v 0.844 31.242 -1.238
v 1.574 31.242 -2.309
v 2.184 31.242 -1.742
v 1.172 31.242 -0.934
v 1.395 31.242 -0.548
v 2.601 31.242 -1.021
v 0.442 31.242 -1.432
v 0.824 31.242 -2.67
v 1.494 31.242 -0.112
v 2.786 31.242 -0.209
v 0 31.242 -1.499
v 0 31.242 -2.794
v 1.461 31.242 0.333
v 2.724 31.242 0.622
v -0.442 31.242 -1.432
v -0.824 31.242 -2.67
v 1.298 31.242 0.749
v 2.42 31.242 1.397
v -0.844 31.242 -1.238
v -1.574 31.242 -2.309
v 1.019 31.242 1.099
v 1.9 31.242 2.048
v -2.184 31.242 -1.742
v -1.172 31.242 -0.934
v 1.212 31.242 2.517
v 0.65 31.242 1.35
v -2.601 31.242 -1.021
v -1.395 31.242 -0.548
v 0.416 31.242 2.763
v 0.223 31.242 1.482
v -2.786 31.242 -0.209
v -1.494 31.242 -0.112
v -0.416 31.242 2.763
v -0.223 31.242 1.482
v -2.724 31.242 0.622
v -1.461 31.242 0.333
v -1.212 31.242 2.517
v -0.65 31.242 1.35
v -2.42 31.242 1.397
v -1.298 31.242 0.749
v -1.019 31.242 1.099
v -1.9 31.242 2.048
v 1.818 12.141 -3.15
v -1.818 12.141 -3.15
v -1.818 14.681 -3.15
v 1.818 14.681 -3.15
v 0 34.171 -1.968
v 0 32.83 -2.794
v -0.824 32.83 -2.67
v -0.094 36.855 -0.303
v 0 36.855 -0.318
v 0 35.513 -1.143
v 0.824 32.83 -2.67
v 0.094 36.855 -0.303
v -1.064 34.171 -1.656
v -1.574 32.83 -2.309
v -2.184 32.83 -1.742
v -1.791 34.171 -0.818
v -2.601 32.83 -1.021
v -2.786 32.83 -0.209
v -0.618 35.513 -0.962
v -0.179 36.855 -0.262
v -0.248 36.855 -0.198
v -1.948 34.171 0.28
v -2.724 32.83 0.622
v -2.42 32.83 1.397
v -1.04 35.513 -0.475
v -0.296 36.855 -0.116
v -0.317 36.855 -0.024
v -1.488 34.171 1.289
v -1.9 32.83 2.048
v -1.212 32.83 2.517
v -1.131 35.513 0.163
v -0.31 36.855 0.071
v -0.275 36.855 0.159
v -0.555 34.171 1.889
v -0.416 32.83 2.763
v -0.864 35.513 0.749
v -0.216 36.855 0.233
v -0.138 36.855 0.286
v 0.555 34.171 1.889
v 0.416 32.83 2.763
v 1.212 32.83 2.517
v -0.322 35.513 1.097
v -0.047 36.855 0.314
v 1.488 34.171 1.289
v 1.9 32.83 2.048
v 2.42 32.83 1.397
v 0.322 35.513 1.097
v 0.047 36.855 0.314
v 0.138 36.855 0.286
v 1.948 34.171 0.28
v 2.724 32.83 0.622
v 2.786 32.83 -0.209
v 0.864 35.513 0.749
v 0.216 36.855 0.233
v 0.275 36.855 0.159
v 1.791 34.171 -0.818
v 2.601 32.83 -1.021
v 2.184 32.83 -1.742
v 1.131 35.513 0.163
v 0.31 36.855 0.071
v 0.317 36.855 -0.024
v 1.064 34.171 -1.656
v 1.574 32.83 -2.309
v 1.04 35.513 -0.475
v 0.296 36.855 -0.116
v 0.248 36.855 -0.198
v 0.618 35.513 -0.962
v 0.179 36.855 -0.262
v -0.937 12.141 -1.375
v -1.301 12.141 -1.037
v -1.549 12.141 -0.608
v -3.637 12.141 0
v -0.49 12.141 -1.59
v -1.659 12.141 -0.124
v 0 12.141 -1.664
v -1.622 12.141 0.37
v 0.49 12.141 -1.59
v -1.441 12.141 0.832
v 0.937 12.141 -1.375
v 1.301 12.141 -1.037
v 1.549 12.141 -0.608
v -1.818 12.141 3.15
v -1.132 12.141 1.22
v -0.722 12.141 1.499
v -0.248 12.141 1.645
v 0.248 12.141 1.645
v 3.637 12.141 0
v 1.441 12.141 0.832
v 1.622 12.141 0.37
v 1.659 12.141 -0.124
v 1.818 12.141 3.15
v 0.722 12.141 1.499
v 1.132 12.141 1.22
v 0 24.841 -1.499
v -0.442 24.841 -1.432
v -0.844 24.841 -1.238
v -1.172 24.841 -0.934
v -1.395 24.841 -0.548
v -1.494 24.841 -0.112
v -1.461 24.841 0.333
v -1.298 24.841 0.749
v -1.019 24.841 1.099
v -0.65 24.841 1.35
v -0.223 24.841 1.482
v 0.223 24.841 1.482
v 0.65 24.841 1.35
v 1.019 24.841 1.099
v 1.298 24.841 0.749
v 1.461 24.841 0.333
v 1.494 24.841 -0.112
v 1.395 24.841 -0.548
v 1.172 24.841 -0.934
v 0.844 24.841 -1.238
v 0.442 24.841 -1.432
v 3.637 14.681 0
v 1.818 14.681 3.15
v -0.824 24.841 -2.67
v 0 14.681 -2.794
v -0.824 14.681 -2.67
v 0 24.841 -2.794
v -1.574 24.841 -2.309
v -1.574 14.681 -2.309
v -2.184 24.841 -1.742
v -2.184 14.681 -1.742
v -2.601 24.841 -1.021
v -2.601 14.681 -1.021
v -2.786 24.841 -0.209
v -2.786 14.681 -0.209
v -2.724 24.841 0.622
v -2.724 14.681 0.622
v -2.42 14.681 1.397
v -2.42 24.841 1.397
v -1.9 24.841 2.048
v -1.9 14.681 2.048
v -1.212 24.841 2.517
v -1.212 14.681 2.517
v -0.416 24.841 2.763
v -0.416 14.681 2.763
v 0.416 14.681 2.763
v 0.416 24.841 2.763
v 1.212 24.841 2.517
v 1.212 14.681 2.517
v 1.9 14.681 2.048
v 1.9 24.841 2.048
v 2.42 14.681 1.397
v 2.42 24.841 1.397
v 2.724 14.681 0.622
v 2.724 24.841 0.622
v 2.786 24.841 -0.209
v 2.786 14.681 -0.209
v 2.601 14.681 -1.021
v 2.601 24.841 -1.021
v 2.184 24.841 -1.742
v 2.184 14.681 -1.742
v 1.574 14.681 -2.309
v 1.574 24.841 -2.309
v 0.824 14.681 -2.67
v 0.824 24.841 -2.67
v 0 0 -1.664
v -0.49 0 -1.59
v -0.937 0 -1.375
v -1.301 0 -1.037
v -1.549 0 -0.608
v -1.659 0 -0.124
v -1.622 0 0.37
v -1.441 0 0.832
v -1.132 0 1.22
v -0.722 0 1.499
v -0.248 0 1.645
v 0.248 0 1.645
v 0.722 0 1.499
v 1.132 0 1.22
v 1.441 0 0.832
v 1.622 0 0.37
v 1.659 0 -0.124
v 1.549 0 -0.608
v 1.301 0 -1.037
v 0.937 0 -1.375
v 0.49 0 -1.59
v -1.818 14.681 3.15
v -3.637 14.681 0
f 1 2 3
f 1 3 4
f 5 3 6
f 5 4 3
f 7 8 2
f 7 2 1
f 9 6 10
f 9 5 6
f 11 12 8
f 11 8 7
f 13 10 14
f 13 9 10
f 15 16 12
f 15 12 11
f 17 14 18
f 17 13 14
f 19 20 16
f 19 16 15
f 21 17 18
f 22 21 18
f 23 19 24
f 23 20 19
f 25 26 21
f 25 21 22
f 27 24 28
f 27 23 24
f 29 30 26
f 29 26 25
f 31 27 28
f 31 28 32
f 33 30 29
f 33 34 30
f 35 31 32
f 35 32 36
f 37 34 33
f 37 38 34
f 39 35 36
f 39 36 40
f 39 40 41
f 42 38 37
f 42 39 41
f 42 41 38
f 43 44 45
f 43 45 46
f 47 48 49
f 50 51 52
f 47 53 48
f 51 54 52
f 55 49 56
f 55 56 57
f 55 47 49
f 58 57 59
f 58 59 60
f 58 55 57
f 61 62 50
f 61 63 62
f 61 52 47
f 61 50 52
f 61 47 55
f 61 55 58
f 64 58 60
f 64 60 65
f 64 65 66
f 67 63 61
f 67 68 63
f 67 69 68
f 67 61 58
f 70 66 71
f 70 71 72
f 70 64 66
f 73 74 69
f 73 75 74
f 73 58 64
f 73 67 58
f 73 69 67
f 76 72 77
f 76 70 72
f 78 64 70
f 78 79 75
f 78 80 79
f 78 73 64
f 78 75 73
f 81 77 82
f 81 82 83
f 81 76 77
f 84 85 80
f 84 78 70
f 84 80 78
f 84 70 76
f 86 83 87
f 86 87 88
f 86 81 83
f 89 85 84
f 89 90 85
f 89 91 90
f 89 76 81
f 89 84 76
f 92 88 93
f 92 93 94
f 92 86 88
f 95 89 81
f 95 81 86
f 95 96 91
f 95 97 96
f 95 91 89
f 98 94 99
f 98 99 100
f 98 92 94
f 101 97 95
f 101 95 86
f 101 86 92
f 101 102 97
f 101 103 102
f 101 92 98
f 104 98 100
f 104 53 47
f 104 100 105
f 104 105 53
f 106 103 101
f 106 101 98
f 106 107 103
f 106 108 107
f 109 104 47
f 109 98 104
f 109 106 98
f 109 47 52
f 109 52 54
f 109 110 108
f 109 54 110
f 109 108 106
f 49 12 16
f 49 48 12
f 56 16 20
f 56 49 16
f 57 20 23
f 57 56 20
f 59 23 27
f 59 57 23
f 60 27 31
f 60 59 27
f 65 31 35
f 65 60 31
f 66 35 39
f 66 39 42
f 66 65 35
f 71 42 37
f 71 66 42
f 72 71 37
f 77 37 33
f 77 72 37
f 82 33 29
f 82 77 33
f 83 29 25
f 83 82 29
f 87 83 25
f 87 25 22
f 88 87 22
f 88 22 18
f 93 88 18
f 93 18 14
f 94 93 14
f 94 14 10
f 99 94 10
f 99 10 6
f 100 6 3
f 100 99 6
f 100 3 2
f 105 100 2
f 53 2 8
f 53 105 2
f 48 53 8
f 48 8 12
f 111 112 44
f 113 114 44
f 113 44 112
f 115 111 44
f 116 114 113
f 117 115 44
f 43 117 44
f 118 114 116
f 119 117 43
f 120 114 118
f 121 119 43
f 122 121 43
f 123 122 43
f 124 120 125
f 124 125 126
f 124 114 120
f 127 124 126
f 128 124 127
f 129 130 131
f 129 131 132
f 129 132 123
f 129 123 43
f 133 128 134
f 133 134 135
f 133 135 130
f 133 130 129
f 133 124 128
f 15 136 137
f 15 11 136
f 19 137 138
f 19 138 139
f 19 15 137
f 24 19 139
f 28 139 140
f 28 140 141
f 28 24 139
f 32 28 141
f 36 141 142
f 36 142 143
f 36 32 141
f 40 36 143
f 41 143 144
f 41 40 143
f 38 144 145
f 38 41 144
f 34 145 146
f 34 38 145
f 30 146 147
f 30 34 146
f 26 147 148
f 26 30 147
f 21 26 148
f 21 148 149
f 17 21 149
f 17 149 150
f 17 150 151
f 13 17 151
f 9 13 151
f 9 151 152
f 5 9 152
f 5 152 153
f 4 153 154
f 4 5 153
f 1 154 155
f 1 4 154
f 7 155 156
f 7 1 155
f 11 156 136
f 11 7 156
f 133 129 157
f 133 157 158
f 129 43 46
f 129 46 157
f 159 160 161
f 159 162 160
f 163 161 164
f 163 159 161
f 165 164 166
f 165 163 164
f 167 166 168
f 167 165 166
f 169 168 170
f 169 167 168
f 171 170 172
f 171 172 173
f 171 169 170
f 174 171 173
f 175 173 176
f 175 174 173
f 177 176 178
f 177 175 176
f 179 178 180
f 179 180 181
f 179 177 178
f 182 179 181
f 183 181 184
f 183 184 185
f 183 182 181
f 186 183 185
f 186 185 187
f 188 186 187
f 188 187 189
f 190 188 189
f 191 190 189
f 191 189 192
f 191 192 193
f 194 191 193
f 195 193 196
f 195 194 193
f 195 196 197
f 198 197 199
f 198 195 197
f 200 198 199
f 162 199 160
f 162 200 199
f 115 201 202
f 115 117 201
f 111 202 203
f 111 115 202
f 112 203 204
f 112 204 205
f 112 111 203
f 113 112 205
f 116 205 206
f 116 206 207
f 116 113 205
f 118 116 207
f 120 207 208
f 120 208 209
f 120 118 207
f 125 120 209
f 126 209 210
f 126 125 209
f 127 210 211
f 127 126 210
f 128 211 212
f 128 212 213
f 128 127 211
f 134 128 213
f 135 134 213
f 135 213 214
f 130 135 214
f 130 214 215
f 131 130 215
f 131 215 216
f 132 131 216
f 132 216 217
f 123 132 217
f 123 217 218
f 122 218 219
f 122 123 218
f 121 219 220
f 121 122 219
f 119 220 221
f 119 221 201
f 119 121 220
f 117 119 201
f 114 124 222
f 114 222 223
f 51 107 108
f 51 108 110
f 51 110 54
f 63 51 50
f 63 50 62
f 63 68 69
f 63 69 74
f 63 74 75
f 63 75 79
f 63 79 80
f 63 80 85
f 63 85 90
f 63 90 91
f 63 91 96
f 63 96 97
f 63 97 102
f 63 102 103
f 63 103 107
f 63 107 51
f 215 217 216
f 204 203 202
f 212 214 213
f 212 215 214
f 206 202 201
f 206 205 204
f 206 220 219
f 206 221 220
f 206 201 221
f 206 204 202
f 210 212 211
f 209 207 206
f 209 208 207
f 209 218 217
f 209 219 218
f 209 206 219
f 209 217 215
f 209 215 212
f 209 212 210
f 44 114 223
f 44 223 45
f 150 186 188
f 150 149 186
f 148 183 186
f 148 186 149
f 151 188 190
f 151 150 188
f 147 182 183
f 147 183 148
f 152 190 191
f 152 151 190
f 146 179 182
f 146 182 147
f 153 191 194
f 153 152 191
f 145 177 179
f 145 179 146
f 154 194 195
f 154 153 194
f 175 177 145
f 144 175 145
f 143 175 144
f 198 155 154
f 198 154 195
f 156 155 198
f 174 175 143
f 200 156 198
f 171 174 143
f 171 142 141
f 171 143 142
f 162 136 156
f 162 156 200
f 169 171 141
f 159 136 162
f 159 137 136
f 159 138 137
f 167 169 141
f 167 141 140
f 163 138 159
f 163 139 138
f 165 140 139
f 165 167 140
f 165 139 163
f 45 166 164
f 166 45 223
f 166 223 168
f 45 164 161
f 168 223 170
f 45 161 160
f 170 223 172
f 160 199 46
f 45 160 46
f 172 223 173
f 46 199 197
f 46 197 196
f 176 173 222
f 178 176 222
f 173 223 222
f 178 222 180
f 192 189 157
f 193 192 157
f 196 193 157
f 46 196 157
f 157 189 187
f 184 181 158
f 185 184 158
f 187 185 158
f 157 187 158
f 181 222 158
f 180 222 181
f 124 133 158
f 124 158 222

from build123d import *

# Parameters (mm, degrees)
BOSS_EXTRUDE1_DEPTH = 2.54


with BuildPart() as part:
    # Sketch1 → Revolve1 (revolve)
    with BuildSketch(Plane.XY, mode=Mode.PRIVATE) as revolve1_sk:
        Polygon((0, 0), (1.6637, 0), (1.6637, 12.1412), (2.794, 12.1412), (2.794, 24.8412), (1.4986, 24.8412), (1.4986, 31.242), (2.794, 31.242), (2.794, 32.8295), (0.3175, 36.8554), (0, 36.8554), align=None)
    revolve(revolve1_sk.sketch.rotate(Axis((0, 0, 0), (0, 1, 0)), 90), axis=Axis((0, 0, 0), (0, 1, 0)))  # turned: the seam where the file's is

    # Sketch2 → Boss-Extrude1 (add)
    with BuildSketch(Plane.XZ.offset(-12.1412)):
        Polygon((3.636844816, 0), (1.818422408, 3.1496), (-1.818422408, 3.1496), (-3.636844816, 0), (-1.818422408, -3.1496), (1.818422408, -3.1496), align=None)
    extrude(amount=-BOSS_EXTRUDE1_DEPTH)


solid = part.part
